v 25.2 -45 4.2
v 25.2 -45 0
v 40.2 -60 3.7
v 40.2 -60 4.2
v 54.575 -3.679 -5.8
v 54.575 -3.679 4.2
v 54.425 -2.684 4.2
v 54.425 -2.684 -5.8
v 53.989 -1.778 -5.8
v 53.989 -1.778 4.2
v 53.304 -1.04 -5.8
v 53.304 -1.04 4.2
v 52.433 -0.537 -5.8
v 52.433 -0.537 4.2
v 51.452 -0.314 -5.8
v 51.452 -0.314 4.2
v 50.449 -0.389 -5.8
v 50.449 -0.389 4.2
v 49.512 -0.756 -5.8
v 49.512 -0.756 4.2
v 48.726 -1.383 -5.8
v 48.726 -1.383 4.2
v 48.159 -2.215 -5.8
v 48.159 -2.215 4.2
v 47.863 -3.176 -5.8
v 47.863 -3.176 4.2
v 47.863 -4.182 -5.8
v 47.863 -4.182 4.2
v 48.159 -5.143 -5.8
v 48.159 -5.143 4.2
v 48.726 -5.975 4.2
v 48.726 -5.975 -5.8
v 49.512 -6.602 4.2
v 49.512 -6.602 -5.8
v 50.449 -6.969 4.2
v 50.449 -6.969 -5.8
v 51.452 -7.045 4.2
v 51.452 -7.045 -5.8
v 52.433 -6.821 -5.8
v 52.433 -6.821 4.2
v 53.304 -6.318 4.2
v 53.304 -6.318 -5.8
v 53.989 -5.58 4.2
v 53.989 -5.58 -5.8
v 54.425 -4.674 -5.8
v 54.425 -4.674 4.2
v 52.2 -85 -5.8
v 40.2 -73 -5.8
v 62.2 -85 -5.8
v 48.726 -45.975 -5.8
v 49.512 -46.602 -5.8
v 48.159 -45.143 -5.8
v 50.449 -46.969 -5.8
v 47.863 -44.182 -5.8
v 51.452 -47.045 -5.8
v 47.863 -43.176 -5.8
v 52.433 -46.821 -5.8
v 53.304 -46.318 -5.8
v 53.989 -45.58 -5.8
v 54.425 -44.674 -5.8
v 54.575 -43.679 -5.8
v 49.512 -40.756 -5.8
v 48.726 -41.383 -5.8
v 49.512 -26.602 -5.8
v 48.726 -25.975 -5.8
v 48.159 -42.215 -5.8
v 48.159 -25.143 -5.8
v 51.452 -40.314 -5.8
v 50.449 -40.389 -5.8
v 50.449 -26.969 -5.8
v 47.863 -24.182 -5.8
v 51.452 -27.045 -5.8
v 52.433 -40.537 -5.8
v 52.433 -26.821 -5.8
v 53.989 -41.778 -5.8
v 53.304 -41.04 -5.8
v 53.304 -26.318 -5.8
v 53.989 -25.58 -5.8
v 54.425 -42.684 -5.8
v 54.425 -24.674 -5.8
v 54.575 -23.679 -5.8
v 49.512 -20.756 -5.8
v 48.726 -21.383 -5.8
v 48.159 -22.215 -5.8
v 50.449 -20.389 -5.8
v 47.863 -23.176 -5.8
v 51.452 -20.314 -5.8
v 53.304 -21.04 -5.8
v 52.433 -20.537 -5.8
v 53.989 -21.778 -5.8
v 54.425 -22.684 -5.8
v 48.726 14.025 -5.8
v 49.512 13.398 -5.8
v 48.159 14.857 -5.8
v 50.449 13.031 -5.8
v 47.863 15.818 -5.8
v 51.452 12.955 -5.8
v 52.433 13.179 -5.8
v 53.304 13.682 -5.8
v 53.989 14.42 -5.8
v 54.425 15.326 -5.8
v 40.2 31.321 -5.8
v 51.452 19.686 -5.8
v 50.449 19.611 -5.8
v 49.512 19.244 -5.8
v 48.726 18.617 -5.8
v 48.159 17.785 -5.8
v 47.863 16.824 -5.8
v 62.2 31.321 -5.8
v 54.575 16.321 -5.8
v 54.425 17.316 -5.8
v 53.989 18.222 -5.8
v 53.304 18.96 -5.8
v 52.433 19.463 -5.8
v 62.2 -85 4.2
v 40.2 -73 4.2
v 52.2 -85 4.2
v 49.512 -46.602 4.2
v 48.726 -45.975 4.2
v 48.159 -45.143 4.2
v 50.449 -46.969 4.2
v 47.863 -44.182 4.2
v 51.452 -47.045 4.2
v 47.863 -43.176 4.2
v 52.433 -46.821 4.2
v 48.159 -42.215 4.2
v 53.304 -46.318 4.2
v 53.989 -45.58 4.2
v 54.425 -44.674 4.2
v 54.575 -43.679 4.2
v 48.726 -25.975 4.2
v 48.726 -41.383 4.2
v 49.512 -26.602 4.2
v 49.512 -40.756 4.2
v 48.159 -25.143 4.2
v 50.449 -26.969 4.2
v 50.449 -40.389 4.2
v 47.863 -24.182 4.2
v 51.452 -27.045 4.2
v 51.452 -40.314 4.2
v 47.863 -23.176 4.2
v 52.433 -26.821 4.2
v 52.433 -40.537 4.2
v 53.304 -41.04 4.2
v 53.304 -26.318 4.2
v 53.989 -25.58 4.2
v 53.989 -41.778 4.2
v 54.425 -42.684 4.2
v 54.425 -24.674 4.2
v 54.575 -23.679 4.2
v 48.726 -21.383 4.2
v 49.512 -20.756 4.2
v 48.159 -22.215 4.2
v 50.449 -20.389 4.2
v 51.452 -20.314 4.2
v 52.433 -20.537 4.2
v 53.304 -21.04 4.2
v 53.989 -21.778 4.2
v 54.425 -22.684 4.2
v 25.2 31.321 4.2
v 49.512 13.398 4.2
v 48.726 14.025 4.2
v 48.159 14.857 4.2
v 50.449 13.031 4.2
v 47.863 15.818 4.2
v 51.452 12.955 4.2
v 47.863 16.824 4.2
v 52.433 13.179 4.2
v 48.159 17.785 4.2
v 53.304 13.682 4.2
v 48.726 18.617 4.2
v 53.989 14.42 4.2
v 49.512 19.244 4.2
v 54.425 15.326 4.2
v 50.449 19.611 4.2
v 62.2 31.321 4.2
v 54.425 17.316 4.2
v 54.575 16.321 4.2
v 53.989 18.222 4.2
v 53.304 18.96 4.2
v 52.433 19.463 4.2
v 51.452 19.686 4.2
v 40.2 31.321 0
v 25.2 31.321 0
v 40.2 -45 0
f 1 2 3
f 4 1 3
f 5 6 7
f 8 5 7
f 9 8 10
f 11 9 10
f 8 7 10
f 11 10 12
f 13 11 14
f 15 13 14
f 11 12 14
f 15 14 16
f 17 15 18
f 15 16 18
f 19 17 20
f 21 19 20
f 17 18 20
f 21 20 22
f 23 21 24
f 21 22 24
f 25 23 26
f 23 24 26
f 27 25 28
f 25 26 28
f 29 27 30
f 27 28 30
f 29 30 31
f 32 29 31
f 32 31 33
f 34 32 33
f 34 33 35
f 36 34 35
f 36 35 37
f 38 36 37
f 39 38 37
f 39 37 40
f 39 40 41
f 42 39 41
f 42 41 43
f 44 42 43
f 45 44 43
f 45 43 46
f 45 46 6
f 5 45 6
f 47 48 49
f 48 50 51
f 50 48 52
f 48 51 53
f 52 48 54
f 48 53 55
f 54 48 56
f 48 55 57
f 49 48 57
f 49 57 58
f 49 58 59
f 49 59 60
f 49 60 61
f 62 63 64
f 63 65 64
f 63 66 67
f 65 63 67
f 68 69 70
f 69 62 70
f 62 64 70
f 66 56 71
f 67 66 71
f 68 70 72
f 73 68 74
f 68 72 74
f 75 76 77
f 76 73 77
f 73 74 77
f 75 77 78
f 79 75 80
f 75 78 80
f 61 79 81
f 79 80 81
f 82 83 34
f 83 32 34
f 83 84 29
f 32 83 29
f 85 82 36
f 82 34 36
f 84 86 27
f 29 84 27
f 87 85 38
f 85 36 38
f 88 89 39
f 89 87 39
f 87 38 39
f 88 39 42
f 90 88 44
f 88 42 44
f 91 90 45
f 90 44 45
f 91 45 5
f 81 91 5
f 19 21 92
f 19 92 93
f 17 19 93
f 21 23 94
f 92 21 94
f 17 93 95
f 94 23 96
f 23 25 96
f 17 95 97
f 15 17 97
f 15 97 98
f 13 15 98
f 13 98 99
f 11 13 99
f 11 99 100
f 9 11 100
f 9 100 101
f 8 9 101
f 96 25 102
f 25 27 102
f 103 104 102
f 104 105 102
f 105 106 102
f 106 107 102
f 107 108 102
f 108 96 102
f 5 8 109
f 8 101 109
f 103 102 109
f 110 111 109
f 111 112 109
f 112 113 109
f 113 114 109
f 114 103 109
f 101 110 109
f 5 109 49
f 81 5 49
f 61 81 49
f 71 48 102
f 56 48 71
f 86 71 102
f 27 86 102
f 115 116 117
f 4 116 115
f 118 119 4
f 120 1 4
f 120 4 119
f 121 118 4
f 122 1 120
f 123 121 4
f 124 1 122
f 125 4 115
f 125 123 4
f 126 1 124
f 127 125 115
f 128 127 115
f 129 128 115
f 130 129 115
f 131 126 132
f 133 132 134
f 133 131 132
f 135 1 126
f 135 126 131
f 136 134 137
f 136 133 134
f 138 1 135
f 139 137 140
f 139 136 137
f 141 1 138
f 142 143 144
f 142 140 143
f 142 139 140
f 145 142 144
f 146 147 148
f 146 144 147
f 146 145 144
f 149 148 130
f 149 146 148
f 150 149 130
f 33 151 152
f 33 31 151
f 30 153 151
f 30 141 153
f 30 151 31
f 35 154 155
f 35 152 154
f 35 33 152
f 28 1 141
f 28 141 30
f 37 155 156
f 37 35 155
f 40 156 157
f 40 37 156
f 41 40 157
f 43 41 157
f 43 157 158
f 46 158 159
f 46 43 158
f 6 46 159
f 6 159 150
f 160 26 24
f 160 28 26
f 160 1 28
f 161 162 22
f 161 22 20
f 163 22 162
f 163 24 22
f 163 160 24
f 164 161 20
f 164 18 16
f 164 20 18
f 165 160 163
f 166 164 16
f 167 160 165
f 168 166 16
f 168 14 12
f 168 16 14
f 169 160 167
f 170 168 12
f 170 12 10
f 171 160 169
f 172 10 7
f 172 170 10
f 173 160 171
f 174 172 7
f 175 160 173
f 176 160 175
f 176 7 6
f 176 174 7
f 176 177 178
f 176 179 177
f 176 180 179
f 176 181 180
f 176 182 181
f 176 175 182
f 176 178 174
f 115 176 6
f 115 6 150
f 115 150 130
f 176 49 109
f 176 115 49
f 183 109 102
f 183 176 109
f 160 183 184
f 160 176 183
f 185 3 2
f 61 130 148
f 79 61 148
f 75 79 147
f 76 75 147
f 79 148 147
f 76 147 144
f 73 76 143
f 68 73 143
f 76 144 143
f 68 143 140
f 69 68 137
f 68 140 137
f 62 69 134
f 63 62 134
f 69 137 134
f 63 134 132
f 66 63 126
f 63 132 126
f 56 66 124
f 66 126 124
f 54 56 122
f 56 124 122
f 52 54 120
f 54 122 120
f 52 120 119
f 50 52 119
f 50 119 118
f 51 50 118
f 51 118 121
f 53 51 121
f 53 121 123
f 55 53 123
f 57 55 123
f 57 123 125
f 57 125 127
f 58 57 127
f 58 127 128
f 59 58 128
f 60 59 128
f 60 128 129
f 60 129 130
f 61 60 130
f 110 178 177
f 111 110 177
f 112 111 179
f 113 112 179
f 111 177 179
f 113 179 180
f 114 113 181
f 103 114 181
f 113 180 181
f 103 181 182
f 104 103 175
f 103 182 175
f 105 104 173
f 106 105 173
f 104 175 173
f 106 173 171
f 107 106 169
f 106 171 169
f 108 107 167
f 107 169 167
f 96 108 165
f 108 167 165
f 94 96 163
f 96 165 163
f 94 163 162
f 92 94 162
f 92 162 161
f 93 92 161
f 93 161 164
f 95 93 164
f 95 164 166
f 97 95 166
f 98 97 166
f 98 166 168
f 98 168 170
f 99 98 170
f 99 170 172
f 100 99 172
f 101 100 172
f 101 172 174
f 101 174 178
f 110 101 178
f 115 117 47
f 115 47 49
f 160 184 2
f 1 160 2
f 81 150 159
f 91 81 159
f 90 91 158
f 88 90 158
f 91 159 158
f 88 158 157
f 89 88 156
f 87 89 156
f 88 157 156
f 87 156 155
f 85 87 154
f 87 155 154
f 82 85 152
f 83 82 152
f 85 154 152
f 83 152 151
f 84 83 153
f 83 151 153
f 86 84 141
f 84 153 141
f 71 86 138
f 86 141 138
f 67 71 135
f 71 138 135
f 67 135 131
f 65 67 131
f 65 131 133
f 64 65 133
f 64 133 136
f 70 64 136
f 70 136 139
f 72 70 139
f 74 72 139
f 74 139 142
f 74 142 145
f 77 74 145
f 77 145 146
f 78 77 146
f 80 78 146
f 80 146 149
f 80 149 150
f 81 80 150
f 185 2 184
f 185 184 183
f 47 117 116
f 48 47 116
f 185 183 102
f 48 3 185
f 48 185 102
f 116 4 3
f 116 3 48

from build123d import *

# Parameters (mm, degrees)
BOSS_EXTRUDE1_DEPTH = 4.2
BOSS_EXTRUDE2_DEPTH = 5.8
CUT_EXTRUDE1_REACH  = 107.801
SKETCH2_R           = 3.375
LPATTERN1_COUNT     = 4
LPATTERN1_PITCH     = 20
CUT_EXTRUDE2_REACH  = 107.801
CUT_EXTRUDE3_DEPTH  = 15


with BuildPart() as part:
    # Sketch1 → Boss-Extrude1 (new body)
    with BuildSketch(Plane.XY):
        Polygon((40.2, 31.320919527), (25.2, 31.320919527), (25.2, -45), (40.2, -60), align=None)
        Polygon((62.2, 31.320919527), (40.2, 31.320919527), (40.2, -60), (40.2, -85), (62.2, -85), align=None)
    extrude(amount=BOSS_EXTRUDE1_DEPTH)

    # Sketch1<3> → Boss-Extrude2 (add)
    with BuildSketch(Plane.XY):
        Polygon((62.2, 31.320919527), (40.2, 31.320919527), (40.2, -60), (40.2, -85), (62.2, -85), align=None)
    extrude(amount=-BOSS_EXTRUDE2_DEPTH)

    # Sketch2 → Cut-Extrude1 (cut, up to next)
    with BuildSketch(Plane.XY.offset(4.2), mode=Mode.PRIVATE) as cut_extrude1_sk1:
        with Locations((51.2, 16.320919527)):
            Circle(SKETCH2_R)
    cut_extrude1_tool1 = extrude(cut_extrude1_sk1.sketch, amount=-CUT_EXTRUDE1_REACH, mode=Mode.PRIVATE) & part.part
    cut_extrude1 = cut_extrude1_tool1.solids().sort_by_distance((51.2, 16.32092, 4.2))[0]
    add(cut_extrude1, mode=Mode.SUBTRACT)

    # LPattern1: Cut-Extrude1 ×4
    with Locations(*[(0, -i * LPATTERN1_PITCH, 0) for i in range(1, LPATTERN1_COUNT)]):
        add(cut_extrude1, mode=Mode.SUBTRACT)

    # Sketch4 → Cut-Extrude2 (cut, up to next)
    with BuildSketch(Plane.XY.offset(4.2), mode=Mode.PRIVATE) as cut_extrude2_sk1:
        Polygon((52.2, -85), (40.2, -73), (40.2, -85), align=None)
    cut_extrude2_tool1 = extrude(cut_extrude2_sk1.sketch, amount=-CUT_EXTRUDE2_REACH, mode=Mode.PRIVATE) & part.part
    add(cut_extrude2_tool1.solids().sort_by_distance((44.2, -81, 4.2))[0], mode=Mode.SUBTRACT)

    # Sketch6 → Cut-Extrude3 (cut)
    with BuildSketch(Plane.ZY.offset(-25.2)):
        Polygon((3.7, -60), (0, -45), (0, -60), align=None)
    extrude(amount=-CUT_EXTRUDE3_DEPTH, mode=Mode.SUBTRACT)


solid = part.part
